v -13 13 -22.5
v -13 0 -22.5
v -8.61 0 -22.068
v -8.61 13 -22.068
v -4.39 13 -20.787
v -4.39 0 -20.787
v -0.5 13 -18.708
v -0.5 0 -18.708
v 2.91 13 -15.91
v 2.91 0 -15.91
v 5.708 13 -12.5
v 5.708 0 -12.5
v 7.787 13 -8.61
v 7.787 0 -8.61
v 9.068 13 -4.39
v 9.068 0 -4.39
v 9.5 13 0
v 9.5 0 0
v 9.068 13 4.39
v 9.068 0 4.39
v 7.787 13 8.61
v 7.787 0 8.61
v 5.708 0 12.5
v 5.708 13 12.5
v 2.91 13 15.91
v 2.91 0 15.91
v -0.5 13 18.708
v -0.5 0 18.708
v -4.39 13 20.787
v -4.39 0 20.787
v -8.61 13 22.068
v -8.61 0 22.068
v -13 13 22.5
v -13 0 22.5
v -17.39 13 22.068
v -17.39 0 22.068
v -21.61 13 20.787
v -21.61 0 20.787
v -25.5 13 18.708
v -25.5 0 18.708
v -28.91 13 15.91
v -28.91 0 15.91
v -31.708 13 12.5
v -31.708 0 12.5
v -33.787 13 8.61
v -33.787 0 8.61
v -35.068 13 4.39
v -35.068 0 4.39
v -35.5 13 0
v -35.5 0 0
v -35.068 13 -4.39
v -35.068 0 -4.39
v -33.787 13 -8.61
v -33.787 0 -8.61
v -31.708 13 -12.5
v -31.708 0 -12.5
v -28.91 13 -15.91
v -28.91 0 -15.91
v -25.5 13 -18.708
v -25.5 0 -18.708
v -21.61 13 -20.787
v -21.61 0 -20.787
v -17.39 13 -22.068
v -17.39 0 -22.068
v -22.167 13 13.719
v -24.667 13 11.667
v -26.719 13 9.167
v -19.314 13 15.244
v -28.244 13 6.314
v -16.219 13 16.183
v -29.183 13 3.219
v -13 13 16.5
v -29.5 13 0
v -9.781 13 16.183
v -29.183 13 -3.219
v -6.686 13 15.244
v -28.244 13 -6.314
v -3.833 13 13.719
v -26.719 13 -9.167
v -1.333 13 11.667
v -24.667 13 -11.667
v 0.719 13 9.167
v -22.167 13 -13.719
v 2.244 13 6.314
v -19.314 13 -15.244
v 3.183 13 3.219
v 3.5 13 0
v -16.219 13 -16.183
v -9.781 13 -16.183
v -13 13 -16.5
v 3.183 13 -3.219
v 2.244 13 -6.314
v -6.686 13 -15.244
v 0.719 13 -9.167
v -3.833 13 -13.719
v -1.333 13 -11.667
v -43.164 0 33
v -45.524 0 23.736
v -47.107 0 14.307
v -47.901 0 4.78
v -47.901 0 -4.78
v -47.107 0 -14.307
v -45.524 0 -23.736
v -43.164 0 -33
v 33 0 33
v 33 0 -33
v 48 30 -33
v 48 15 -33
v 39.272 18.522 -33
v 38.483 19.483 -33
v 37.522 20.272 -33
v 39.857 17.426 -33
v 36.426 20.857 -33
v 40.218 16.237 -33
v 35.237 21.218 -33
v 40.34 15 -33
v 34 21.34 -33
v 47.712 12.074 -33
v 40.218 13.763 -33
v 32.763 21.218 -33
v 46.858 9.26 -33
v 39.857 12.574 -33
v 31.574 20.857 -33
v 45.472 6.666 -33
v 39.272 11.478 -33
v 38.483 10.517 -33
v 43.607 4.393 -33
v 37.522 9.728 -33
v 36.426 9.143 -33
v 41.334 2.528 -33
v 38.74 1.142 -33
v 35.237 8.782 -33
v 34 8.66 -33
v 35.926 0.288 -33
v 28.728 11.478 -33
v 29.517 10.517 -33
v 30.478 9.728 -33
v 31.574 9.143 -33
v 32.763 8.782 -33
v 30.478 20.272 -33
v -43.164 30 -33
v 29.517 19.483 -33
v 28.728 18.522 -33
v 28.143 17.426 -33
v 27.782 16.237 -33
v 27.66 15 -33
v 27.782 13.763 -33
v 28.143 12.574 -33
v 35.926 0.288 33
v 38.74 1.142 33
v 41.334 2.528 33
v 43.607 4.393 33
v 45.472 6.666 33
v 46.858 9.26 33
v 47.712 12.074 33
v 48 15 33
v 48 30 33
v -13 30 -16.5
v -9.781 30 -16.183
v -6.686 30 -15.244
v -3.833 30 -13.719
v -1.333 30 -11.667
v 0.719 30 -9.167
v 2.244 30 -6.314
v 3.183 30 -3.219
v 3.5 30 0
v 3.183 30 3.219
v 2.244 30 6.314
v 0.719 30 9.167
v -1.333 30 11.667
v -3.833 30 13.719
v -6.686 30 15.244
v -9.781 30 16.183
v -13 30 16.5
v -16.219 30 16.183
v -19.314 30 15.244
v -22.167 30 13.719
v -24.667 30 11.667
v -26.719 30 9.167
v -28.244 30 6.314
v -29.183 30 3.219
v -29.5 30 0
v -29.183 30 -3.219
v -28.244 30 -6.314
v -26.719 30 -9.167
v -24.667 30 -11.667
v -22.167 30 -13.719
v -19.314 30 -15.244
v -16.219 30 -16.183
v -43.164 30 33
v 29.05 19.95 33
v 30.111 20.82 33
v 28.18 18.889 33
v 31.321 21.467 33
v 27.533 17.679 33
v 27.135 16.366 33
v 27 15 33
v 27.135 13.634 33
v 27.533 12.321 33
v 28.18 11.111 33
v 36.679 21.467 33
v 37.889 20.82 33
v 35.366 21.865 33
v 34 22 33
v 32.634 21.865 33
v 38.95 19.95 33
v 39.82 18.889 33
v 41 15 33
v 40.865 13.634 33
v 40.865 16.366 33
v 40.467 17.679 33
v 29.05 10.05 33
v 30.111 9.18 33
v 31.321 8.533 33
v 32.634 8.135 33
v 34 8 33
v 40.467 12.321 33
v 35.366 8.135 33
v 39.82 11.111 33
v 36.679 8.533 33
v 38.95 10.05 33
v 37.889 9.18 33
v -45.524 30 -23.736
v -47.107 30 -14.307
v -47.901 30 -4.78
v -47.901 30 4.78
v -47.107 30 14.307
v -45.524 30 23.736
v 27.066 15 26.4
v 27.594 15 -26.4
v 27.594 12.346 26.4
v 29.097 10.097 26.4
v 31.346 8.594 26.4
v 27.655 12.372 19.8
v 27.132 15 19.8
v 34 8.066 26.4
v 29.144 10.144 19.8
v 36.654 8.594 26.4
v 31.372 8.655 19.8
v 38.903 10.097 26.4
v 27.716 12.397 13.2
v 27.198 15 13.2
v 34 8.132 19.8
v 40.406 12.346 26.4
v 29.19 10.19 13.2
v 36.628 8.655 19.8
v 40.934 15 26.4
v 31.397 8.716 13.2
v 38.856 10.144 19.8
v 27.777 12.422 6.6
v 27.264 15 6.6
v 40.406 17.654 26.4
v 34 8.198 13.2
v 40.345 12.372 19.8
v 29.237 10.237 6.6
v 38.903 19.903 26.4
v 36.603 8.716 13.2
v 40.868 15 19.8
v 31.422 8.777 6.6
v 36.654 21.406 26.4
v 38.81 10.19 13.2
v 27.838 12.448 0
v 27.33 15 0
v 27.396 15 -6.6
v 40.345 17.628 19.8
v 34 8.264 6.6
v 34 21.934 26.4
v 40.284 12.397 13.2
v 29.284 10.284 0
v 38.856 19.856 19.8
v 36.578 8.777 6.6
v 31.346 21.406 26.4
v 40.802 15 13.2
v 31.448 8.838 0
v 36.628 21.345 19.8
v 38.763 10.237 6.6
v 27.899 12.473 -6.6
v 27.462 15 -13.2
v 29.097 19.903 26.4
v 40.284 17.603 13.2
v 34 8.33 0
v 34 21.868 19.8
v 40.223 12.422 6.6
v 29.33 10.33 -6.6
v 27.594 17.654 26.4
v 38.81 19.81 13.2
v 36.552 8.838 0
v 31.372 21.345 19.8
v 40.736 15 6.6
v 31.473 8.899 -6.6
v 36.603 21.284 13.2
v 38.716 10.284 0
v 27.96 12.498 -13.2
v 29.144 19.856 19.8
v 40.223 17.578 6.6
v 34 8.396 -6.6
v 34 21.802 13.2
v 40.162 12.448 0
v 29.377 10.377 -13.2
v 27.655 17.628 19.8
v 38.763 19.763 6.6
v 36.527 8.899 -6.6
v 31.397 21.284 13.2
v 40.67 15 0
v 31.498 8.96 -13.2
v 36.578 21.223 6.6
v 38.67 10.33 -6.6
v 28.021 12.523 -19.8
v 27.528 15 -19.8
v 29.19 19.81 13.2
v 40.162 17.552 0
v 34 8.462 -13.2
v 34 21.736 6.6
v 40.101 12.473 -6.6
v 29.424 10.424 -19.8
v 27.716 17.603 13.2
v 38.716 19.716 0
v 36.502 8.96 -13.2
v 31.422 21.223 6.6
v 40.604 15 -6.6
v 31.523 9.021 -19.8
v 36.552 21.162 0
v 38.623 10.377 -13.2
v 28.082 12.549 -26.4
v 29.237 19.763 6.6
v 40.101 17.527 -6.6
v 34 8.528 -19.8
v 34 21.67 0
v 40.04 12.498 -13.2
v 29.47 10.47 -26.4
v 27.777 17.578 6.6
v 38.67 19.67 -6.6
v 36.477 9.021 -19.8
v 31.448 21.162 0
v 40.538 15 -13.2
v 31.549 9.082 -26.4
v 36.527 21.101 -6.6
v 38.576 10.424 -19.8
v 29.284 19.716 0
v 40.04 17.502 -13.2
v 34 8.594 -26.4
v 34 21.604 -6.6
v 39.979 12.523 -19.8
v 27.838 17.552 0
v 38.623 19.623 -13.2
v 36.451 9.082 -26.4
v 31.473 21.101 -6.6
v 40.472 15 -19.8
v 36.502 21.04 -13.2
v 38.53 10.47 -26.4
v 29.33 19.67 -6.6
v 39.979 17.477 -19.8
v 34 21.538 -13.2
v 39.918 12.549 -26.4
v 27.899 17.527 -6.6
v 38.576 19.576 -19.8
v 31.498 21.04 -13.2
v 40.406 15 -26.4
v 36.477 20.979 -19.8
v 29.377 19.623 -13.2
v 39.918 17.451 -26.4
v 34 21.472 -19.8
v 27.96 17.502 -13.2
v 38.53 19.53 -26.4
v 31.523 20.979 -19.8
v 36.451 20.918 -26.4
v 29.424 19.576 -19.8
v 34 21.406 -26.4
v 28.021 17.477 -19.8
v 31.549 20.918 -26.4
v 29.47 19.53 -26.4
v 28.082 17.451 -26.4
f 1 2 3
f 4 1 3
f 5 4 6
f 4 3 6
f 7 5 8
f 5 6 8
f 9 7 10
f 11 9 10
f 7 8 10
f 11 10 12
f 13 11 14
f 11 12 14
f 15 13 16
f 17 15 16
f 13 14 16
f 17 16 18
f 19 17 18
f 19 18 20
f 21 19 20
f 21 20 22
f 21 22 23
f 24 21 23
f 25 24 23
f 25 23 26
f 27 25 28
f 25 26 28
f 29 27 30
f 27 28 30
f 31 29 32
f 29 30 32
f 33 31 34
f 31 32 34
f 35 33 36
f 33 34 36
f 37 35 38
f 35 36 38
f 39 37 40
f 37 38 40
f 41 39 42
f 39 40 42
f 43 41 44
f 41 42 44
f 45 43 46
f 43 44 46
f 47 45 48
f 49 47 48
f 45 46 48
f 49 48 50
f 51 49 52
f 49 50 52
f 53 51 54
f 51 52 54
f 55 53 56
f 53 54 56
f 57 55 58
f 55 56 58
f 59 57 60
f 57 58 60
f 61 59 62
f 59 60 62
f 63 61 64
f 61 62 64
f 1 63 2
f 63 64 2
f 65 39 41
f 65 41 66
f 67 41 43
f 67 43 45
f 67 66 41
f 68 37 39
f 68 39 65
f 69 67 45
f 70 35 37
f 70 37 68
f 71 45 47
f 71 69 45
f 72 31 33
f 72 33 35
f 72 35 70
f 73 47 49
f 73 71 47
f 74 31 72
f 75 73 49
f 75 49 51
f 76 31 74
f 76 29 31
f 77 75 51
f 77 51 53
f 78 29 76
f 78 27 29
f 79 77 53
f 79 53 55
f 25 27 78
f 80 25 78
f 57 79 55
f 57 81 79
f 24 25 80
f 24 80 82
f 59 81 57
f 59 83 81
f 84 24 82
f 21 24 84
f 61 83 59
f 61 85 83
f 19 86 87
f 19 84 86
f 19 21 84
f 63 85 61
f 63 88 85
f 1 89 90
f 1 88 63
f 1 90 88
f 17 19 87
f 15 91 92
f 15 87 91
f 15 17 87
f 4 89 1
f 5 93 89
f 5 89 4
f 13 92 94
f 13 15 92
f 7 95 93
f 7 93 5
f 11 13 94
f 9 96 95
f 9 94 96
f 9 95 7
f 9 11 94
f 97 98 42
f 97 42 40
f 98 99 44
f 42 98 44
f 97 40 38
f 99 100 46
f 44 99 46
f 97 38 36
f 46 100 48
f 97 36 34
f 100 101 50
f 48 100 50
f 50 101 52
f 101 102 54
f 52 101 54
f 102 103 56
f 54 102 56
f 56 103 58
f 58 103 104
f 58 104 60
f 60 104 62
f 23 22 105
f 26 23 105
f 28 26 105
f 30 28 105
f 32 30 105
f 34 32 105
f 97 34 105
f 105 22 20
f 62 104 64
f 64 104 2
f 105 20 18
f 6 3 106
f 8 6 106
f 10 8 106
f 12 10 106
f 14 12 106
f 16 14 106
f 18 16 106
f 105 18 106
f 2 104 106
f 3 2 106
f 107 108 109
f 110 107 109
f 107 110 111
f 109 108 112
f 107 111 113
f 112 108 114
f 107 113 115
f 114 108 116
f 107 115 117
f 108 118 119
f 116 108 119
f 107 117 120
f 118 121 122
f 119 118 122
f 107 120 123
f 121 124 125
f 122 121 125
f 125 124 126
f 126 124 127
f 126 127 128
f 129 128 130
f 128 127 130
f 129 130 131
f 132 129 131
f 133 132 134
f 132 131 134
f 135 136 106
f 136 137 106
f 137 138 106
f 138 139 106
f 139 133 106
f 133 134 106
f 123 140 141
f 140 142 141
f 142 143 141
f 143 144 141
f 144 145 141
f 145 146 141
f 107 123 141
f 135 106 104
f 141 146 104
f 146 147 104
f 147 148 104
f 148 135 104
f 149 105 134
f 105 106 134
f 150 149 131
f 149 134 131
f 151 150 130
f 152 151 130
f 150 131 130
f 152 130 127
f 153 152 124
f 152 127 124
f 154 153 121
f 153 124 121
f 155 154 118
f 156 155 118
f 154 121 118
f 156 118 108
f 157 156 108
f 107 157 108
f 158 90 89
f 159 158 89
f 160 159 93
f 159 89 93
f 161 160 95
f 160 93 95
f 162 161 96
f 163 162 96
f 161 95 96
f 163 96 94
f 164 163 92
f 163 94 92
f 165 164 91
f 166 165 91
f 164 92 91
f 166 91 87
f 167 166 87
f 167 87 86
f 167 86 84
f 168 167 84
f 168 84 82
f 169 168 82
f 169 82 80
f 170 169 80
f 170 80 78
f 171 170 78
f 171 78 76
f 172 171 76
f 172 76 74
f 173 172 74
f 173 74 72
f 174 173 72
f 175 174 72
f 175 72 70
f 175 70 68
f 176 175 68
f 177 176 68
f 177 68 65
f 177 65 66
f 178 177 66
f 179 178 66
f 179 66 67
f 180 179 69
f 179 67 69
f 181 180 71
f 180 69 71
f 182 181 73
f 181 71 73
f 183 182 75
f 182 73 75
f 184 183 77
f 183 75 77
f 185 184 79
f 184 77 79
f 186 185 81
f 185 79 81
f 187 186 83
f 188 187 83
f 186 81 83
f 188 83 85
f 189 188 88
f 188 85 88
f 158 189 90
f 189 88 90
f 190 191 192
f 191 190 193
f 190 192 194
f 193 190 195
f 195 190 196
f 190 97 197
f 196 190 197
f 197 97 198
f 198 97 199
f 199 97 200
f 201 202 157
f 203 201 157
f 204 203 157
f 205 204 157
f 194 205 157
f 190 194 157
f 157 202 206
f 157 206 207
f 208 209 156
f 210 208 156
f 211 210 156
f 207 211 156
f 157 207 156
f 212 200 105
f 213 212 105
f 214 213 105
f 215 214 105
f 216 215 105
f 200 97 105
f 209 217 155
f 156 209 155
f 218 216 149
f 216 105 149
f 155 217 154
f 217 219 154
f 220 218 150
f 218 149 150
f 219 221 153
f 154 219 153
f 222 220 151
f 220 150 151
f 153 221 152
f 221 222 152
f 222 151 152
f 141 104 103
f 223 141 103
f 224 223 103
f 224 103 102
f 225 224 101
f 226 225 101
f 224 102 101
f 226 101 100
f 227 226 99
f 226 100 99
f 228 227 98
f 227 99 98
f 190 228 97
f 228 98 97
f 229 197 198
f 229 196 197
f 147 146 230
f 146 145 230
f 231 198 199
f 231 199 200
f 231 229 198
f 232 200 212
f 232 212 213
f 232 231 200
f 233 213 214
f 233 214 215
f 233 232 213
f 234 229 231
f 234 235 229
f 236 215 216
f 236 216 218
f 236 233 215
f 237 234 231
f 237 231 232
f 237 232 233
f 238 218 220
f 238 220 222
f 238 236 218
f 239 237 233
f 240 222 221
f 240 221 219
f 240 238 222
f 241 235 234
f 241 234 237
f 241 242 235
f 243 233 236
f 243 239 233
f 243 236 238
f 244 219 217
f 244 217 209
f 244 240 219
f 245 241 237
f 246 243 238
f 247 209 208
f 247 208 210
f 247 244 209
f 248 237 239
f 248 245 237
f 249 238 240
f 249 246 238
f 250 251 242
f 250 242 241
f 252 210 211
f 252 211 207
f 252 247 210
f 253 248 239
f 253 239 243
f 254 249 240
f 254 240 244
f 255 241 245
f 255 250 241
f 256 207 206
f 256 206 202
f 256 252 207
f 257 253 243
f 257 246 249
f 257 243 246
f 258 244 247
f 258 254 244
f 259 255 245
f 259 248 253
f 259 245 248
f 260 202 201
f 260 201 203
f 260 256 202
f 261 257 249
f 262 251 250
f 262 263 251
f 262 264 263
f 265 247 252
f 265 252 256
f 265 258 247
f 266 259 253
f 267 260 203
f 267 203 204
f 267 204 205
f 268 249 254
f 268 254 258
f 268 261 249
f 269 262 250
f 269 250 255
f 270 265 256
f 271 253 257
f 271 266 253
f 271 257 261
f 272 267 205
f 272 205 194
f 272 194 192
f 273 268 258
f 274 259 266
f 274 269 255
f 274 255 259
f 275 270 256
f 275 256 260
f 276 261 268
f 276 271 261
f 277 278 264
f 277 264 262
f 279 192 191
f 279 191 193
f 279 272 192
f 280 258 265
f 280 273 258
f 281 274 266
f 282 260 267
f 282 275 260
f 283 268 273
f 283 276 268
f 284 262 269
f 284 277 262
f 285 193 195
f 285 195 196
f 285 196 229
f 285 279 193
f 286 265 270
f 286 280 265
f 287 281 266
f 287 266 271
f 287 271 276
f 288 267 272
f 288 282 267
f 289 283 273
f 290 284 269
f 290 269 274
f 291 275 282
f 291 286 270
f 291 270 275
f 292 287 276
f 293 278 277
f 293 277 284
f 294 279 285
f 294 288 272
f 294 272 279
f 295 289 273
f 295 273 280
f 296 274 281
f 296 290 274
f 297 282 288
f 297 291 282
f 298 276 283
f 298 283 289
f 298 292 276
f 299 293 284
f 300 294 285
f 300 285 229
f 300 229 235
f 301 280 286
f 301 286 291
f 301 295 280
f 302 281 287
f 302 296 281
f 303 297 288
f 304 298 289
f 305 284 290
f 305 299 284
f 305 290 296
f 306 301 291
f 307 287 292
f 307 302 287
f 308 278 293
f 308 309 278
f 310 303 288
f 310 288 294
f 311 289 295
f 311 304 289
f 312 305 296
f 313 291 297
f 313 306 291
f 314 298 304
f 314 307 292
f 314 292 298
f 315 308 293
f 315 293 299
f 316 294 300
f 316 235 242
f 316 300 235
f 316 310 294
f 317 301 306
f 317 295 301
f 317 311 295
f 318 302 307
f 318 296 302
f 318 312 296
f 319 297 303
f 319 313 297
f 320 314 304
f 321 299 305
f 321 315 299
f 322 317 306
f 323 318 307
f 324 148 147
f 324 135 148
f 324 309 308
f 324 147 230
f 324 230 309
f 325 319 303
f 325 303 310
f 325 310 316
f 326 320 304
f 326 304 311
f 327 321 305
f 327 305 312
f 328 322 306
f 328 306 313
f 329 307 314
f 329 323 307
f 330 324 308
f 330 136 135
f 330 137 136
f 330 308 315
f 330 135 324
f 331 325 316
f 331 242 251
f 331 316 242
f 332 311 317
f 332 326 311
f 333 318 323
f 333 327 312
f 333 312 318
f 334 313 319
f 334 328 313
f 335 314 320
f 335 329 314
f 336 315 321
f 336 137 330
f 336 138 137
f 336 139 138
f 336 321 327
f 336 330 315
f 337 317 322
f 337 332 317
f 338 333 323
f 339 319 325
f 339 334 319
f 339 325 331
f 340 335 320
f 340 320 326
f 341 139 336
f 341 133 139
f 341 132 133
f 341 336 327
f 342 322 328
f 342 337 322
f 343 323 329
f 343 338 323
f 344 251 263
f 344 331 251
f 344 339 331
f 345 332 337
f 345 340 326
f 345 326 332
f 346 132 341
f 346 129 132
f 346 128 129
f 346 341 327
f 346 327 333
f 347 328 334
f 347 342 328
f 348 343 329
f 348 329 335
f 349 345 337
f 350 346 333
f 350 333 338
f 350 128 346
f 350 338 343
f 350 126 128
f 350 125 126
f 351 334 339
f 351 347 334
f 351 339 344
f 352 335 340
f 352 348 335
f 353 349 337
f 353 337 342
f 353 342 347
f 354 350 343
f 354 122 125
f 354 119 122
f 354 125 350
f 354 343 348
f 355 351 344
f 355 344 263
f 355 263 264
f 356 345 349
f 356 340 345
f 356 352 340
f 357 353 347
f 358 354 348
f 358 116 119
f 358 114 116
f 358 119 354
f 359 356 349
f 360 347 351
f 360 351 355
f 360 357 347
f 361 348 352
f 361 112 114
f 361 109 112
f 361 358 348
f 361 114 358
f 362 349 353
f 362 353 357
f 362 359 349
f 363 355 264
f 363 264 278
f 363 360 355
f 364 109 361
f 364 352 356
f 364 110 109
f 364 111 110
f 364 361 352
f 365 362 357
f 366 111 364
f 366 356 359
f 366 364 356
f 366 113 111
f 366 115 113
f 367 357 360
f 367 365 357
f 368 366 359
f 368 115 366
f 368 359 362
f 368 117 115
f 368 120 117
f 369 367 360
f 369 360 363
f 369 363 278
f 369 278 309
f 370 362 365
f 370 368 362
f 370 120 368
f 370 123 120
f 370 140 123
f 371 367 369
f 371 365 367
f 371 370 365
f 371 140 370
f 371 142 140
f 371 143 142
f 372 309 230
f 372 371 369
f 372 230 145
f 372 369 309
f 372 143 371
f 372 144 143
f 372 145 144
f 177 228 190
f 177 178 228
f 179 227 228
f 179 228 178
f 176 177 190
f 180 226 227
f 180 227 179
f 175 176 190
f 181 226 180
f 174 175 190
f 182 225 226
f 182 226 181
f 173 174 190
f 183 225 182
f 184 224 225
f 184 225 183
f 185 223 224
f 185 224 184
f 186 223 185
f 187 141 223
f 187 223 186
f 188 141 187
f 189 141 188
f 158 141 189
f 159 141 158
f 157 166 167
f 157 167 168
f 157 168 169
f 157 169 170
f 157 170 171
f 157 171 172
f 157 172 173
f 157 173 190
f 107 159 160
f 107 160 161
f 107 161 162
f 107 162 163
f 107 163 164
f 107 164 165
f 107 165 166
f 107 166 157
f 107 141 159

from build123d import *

# Parameters (mm, degrees)
BOSS_EXTRUDE1_DEPTH = 30
SKETCH2_R           = 22.5
CUT_EXTRUDE1_DEPTH  = 13
SKETCH3_R           = 16.5
CUT_EXTRUDE2_DEPTH  = 61.679485825
FILLET1_R           = 15


with BuildPart() as part:
    # Sketch1 → Boss-Extrude1 (new body)
    with BuildSketch(Plane(origin=(0, 0, 0), x_dir=(1, 0, 0), z_dir=(0, 1, 0))):
        with BuildLine():
            ThreePointArc((-43.163514831, 33), (-48, 0), (-43.163514831, -33))
            Line((-43.163514831, -33), (48, -33))
            Line((48, -33), (48, 33))
            Line((48, 33), (-43.163514831, 33))
        make_face()
    extrude(amount=BOSS_EXTRUDE1_DEPTH)

    # Sketch2 → Cut-Extrude1 (cut)
    with BuildSketch(Plane.XZ):
        with Locations(Location((-13, 0, 0), (0, 0, 270))):
            Circle(SKETCH2_R)
    extrude(amount=-CUT_EXTRUDE1_DEPTH, mode=Mode.SUBTRACT)

    # Sketch3 → Cut-Extrude2 (cut, through all)
    with BuildSketch(Plane.XZ.offset(-13)):
        with Locations(Location((-13, 0, 0), (0, 0, 270))):
            Circle(SKETCH3_R)
    extrude(amount=-CUT_EXTRUDE2_DEPTH, mode=Mode.SUBTRACT)

    # Fillet1
    fillet1_edges = [part.edges().sort_by_distance(p)[0] for p in [
        (48, 0, 0),
    ]]
    fillet(fillet1_edges, radius=FILLET1_R)

    # Sketch4 → Cut-Revolve1 (revolve, cut)
    with BuildSketch(Plane(origin=(0, 15, 0), x_dir=(1, 0, 0), z_dir=(0, 1, 0)), mode=Mode.PRIVATE) as cut_revolve1_sk:
        Polygon((41, -33), (40.34, 33), (34, 33), (34, -33), align=None)
    revolve(cut_revolve1_sk.sketch.rotate(Axis((34, 15, -33), (0, 0, 1)), 180), axis=Axis((34, 15, -33), (0, 0, 1)), mode=Mode.SUBTRACT)


solid = part.part
